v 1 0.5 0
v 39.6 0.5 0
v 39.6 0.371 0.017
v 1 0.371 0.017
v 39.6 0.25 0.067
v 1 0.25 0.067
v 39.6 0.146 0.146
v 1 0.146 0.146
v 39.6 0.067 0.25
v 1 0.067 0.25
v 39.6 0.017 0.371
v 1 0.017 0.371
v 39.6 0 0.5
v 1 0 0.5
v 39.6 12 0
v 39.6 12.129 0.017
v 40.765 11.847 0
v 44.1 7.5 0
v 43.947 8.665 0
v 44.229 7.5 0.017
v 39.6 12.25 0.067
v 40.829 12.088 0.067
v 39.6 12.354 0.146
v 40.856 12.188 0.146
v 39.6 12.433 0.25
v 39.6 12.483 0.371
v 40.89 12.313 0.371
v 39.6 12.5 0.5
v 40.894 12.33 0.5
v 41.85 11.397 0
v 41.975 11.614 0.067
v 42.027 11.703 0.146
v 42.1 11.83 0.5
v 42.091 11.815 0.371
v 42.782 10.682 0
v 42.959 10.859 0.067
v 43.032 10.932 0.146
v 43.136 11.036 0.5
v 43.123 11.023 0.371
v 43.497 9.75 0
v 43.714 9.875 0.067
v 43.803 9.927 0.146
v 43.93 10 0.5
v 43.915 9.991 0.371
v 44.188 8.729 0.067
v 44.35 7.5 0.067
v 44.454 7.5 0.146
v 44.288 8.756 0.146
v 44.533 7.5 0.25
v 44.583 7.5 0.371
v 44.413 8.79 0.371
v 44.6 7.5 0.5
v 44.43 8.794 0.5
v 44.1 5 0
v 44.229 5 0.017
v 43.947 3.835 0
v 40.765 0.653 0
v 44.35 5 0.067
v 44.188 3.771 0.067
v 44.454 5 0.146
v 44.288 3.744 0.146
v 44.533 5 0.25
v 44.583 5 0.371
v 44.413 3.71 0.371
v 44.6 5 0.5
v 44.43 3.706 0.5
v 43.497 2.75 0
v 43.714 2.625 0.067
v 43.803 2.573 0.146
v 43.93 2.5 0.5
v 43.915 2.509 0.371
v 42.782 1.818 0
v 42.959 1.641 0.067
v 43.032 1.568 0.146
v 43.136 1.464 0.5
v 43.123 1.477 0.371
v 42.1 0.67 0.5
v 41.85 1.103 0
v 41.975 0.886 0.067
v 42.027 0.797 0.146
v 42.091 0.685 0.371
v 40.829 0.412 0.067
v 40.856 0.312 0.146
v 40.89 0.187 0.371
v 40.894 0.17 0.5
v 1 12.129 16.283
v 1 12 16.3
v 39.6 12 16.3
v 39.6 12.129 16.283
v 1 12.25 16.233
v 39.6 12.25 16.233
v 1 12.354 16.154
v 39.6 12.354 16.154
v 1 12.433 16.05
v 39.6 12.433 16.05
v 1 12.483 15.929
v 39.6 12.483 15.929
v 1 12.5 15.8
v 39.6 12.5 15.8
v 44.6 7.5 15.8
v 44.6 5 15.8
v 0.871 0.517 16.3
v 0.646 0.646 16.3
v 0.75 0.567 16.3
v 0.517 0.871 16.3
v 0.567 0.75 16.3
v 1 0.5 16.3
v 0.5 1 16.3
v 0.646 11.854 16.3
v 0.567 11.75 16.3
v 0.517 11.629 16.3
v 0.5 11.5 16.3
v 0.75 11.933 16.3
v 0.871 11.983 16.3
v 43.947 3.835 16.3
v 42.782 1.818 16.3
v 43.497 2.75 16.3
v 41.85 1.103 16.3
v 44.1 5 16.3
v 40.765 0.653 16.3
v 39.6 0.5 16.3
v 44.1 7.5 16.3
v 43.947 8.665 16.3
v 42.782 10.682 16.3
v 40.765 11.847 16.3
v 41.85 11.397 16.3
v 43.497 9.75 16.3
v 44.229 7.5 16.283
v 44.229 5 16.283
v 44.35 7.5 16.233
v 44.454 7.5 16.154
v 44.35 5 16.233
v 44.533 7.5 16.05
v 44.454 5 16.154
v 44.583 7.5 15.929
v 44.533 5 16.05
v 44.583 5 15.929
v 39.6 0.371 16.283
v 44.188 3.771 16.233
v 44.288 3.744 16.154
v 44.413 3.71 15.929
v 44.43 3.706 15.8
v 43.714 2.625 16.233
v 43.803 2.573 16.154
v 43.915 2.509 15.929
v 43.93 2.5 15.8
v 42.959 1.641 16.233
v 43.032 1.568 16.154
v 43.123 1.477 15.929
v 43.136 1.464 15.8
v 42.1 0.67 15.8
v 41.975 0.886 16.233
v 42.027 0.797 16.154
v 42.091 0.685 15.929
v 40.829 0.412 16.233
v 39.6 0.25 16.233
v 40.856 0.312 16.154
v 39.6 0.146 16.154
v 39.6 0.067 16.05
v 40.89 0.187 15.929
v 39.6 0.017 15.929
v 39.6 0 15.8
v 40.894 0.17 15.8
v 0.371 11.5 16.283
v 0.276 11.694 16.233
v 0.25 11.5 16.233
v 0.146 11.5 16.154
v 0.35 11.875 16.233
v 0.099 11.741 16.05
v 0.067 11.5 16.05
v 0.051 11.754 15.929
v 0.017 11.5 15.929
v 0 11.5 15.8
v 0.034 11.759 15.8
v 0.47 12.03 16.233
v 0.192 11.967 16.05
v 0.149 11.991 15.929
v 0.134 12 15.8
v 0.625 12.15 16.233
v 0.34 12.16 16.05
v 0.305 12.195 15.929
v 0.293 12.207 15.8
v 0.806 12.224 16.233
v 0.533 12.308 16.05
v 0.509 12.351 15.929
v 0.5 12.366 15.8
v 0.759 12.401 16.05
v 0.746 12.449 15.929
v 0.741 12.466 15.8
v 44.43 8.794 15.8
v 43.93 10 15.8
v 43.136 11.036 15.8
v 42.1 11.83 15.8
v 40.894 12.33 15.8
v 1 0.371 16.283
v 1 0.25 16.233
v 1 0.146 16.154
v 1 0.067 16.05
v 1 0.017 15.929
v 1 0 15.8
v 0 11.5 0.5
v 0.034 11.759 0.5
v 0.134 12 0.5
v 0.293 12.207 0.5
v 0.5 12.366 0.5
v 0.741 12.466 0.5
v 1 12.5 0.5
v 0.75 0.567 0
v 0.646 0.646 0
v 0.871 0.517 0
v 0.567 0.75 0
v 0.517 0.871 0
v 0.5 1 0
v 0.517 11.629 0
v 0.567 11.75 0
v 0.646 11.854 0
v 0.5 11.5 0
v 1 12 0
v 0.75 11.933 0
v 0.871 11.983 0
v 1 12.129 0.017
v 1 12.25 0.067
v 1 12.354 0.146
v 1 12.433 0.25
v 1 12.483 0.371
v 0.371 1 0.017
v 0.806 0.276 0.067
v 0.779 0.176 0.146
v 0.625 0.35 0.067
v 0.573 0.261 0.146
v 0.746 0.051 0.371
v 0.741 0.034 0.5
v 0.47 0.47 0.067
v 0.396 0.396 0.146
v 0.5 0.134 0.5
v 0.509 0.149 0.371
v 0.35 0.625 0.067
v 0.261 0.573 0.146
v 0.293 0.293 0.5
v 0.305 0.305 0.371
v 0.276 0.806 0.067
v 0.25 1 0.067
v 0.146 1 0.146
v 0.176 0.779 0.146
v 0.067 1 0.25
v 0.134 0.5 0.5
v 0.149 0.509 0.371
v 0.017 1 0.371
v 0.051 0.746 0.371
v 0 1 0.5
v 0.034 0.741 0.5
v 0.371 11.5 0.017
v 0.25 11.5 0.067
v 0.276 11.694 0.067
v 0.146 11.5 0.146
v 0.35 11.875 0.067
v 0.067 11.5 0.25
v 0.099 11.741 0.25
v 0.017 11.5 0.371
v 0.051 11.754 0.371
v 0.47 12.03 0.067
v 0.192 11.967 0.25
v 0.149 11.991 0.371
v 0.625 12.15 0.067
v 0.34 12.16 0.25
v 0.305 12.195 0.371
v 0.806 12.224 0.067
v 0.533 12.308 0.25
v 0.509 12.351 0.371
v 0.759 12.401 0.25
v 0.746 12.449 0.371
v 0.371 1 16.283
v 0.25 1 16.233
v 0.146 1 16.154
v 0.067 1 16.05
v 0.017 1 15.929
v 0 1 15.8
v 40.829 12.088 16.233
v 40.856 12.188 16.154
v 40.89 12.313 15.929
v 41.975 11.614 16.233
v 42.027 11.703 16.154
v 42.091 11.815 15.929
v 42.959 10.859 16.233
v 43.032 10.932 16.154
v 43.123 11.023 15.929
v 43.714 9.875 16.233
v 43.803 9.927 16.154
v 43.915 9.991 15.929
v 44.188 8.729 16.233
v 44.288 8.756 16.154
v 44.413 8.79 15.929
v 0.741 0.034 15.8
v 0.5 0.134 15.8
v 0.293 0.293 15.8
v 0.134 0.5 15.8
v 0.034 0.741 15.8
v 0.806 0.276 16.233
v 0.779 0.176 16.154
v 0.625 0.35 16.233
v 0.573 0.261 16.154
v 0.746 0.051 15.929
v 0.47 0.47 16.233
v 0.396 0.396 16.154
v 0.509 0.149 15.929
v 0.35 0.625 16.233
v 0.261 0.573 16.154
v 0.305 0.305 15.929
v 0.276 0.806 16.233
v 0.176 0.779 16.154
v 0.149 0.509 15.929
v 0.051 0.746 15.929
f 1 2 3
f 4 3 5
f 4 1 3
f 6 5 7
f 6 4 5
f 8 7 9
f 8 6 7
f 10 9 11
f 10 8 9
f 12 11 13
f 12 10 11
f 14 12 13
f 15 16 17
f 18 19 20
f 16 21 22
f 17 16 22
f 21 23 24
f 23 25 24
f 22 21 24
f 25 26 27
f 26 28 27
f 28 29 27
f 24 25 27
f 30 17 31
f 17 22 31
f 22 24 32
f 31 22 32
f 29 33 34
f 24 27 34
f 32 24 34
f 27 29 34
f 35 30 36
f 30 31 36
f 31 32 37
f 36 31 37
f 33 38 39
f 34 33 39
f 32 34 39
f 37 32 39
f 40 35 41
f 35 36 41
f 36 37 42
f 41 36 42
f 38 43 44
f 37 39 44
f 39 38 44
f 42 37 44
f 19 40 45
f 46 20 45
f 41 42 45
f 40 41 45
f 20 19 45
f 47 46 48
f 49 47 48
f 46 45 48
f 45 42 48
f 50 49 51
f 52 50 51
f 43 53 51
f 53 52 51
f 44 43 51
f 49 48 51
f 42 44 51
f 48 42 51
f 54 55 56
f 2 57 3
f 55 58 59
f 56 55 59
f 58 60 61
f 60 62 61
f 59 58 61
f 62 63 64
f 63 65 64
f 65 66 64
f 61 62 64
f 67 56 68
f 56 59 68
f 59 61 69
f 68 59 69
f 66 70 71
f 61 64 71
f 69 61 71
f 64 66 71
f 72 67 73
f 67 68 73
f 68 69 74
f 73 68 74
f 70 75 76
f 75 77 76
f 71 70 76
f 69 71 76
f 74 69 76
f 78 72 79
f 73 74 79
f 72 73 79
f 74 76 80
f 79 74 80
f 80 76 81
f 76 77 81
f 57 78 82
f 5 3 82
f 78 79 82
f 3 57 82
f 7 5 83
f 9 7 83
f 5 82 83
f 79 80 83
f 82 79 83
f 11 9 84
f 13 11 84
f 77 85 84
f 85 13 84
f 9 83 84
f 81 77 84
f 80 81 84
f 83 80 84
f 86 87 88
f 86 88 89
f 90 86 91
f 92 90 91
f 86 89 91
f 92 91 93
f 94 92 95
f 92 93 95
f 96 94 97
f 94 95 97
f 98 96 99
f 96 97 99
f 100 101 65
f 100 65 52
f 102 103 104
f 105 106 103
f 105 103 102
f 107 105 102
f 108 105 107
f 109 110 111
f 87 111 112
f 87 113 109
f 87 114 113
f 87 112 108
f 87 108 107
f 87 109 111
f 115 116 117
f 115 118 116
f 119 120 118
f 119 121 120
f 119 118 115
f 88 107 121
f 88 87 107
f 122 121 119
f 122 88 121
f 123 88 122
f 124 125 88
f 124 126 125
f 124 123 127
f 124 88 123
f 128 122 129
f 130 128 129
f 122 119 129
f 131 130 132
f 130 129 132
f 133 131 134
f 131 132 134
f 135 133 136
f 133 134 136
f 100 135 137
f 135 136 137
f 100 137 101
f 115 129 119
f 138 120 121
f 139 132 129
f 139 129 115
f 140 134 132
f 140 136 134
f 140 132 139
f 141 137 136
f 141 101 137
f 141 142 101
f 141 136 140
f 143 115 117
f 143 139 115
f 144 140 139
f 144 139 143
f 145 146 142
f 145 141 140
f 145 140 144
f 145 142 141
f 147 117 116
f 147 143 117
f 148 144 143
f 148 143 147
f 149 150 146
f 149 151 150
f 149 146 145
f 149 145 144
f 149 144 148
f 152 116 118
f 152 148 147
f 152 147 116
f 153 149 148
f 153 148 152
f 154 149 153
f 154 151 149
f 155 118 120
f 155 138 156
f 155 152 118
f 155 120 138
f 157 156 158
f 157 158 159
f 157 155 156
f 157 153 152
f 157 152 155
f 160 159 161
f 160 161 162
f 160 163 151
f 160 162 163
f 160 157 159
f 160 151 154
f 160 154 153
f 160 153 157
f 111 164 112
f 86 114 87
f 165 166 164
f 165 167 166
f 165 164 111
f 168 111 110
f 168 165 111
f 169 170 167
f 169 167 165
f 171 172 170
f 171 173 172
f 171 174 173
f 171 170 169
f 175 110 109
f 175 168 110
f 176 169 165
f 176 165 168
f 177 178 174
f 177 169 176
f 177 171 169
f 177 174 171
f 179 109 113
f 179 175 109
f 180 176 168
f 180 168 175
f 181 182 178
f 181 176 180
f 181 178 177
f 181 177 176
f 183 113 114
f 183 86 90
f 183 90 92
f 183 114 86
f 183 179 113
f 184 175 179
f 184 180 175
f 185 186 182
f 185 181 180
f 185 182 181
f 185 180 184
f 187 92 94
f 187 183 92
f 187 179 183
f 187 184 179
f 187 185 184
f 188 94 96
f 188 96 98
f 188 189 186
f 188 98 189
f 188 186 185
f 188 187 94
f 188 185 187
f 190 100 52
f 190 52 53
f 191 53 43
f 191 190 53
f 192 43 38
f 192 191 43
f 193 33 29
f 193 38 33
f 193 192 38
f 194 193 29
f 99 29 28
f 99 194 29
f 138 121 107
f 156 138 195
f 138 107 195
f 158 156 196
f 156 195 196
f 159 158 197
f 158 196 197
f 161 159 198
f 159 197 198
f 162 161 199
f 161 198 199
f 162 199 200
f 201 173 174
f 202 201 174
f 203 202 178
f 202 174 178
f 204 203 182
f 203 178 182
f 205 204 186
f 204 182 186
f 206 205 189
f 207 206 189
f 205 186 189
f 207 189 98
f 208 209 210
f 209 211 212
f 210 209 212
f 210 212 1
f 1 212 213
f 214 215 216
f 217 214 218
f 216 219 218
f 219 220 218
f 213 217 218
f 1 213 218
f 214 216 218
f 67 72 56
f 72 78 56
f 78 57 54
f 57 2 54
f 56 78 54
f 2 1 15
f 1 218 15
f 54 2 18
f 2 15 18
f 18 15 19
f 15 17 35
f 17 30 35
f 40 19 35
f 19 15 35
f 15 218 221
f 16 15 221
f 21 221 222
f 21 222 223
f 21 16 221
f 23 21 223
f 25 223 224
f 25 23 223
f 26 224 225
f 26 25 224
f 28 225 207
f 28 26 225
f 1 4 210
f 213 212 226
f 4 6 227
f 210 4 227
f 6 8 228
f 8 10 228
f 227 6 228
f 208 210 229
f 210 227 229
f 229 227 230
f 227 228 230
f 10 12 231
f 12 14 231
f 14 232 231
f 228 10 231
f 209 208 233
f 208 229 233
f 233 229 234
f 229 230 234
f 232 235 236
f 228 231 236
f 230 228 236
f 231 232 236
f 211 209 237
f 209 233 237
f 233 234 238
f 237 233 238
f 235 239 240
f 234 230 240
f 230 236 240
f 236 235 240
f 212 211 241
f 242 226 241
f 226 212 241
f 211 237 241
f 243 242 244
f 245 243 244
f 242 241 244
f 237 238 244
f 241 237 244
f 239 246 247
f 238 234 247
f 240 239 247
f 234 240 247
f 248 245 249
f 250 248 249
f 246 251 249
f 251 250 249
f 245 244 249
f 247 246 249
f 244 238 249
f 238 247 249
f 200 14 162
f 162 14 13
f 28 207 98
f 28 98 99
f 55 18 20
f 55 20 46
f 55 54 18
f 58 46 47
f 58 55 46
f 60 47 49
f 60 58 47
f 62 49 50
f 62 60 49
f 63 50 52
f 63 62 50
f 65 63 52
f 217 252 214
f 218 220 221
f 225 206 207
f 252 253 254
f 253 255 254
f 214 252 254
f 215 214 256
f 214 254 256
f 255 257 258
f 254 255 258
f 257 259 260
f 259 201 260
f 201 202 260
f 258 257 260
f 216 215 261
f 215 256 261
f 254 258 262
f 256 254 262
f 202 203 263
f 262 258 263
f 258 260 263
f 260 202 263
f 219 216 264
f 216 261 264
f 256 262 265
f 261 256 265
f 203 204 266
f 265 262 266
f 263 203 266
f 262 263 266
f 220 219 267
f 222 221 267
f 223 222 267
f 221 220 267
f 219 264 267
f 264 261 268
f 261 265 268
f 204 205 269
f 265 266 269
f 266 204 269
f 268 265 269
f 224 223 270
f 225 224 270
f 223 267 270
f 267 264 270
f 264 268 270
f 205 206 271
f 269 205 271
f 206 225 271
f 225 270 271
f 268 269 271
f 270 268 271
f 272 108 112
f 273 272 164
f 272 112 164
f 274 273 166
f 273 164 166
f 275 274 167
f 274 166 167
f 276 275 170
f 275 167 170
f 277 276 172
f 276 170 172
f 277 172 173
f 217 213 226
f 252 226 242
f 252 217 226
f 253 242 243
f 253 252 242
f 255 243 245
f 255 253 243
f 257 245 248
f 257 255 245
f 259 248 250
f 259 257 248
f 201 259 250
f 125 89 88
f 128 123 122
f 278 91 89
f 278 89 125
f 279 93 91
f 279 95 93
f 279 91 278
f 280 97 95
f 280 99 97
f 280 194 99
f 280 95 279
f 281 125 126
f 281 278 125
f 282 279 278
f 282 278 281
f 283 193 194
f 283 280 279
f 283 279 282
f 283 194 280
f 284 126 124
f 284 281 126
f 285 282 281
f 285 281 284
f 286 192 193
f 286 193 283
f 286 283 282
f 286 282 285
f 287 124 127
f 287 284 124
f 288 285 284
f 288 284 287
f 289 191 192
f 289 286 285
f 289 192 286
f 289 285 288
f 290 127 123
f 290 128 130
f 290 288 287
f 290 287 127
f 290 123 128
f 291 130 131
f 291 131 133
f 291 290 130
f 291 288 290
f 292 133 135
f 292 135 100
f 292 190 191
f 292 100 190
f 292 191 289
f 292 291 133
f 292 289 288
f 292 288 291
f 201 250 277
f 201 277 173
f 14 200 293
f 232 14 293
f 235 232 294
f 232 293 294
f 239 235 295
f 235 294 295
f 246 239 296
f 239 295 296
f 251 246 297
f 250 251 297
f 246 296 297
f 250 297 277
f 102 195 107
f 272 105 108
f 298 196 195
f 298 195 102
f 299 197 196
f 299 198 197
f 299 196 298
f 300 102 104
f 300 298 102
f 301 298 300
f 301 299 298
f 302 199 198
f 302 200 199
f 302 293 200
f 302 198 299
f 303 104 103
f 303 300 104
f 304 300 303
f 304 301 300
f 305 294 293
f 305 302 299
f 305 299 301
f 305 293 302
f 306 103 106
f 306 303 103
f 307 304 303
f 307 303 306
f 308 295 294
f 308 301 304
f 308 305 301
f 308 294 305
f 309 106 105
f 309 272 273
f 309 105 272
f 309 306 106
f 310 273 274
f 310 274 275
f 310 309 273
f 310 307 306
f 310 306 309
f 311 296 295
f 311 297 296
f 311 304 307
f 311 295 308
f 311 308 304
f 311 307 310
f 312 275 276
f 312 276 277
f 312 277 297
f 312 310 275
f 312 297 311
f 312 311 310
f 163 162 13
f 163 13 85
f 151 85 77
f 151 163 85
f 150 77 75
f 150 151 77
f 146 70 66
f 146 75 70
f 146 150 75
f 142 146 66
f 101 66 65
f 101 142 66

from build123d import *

# Parameters (mm, degrees)
BOX_W       = 44.6
BOX_H       = 12.5
BOX_DEPTH   = 16.3
FILLET_R    = 5
FILLET001_R = 1
FILLET002_R = 0.5


with BuildPart() as part:
    # Box → Box (new body)
    with BuildSketch(Plane.XY):
        with Locations((22.3, 6.25)):
            Rectangle(BOX_W, BOX_H)
    extrude(amount=BOX_DEPTH)

    # Fillet
    fillet_edges = [part.edges().sort_by_distance(p)[0] for p in [
        (44.6, 0, 8.15),
        (44.6, 12.5, 8.15),
    ]]
    fillet(fillet_edges, radius=FILLET_R)

    # Fillet001
    fillet001_edges = [part.edges().sort_by_distance(p)[0] for p in [
        (0, 12.5, 8.15),
        (0, 0, 8.15),
    ]]
    fillet(fillet001_edges, radius=FILLET001_R)

    # Fillet002
    fillet002_edges = [part.edges().sort_by_distance(p)[0] for p in [
        (20.3, 12.5, 16.3),
        (20.3, 12.5, 0),
    ]]
    fillet(fillet002_edges, radius=FILLET002_R)


solid = part.part
